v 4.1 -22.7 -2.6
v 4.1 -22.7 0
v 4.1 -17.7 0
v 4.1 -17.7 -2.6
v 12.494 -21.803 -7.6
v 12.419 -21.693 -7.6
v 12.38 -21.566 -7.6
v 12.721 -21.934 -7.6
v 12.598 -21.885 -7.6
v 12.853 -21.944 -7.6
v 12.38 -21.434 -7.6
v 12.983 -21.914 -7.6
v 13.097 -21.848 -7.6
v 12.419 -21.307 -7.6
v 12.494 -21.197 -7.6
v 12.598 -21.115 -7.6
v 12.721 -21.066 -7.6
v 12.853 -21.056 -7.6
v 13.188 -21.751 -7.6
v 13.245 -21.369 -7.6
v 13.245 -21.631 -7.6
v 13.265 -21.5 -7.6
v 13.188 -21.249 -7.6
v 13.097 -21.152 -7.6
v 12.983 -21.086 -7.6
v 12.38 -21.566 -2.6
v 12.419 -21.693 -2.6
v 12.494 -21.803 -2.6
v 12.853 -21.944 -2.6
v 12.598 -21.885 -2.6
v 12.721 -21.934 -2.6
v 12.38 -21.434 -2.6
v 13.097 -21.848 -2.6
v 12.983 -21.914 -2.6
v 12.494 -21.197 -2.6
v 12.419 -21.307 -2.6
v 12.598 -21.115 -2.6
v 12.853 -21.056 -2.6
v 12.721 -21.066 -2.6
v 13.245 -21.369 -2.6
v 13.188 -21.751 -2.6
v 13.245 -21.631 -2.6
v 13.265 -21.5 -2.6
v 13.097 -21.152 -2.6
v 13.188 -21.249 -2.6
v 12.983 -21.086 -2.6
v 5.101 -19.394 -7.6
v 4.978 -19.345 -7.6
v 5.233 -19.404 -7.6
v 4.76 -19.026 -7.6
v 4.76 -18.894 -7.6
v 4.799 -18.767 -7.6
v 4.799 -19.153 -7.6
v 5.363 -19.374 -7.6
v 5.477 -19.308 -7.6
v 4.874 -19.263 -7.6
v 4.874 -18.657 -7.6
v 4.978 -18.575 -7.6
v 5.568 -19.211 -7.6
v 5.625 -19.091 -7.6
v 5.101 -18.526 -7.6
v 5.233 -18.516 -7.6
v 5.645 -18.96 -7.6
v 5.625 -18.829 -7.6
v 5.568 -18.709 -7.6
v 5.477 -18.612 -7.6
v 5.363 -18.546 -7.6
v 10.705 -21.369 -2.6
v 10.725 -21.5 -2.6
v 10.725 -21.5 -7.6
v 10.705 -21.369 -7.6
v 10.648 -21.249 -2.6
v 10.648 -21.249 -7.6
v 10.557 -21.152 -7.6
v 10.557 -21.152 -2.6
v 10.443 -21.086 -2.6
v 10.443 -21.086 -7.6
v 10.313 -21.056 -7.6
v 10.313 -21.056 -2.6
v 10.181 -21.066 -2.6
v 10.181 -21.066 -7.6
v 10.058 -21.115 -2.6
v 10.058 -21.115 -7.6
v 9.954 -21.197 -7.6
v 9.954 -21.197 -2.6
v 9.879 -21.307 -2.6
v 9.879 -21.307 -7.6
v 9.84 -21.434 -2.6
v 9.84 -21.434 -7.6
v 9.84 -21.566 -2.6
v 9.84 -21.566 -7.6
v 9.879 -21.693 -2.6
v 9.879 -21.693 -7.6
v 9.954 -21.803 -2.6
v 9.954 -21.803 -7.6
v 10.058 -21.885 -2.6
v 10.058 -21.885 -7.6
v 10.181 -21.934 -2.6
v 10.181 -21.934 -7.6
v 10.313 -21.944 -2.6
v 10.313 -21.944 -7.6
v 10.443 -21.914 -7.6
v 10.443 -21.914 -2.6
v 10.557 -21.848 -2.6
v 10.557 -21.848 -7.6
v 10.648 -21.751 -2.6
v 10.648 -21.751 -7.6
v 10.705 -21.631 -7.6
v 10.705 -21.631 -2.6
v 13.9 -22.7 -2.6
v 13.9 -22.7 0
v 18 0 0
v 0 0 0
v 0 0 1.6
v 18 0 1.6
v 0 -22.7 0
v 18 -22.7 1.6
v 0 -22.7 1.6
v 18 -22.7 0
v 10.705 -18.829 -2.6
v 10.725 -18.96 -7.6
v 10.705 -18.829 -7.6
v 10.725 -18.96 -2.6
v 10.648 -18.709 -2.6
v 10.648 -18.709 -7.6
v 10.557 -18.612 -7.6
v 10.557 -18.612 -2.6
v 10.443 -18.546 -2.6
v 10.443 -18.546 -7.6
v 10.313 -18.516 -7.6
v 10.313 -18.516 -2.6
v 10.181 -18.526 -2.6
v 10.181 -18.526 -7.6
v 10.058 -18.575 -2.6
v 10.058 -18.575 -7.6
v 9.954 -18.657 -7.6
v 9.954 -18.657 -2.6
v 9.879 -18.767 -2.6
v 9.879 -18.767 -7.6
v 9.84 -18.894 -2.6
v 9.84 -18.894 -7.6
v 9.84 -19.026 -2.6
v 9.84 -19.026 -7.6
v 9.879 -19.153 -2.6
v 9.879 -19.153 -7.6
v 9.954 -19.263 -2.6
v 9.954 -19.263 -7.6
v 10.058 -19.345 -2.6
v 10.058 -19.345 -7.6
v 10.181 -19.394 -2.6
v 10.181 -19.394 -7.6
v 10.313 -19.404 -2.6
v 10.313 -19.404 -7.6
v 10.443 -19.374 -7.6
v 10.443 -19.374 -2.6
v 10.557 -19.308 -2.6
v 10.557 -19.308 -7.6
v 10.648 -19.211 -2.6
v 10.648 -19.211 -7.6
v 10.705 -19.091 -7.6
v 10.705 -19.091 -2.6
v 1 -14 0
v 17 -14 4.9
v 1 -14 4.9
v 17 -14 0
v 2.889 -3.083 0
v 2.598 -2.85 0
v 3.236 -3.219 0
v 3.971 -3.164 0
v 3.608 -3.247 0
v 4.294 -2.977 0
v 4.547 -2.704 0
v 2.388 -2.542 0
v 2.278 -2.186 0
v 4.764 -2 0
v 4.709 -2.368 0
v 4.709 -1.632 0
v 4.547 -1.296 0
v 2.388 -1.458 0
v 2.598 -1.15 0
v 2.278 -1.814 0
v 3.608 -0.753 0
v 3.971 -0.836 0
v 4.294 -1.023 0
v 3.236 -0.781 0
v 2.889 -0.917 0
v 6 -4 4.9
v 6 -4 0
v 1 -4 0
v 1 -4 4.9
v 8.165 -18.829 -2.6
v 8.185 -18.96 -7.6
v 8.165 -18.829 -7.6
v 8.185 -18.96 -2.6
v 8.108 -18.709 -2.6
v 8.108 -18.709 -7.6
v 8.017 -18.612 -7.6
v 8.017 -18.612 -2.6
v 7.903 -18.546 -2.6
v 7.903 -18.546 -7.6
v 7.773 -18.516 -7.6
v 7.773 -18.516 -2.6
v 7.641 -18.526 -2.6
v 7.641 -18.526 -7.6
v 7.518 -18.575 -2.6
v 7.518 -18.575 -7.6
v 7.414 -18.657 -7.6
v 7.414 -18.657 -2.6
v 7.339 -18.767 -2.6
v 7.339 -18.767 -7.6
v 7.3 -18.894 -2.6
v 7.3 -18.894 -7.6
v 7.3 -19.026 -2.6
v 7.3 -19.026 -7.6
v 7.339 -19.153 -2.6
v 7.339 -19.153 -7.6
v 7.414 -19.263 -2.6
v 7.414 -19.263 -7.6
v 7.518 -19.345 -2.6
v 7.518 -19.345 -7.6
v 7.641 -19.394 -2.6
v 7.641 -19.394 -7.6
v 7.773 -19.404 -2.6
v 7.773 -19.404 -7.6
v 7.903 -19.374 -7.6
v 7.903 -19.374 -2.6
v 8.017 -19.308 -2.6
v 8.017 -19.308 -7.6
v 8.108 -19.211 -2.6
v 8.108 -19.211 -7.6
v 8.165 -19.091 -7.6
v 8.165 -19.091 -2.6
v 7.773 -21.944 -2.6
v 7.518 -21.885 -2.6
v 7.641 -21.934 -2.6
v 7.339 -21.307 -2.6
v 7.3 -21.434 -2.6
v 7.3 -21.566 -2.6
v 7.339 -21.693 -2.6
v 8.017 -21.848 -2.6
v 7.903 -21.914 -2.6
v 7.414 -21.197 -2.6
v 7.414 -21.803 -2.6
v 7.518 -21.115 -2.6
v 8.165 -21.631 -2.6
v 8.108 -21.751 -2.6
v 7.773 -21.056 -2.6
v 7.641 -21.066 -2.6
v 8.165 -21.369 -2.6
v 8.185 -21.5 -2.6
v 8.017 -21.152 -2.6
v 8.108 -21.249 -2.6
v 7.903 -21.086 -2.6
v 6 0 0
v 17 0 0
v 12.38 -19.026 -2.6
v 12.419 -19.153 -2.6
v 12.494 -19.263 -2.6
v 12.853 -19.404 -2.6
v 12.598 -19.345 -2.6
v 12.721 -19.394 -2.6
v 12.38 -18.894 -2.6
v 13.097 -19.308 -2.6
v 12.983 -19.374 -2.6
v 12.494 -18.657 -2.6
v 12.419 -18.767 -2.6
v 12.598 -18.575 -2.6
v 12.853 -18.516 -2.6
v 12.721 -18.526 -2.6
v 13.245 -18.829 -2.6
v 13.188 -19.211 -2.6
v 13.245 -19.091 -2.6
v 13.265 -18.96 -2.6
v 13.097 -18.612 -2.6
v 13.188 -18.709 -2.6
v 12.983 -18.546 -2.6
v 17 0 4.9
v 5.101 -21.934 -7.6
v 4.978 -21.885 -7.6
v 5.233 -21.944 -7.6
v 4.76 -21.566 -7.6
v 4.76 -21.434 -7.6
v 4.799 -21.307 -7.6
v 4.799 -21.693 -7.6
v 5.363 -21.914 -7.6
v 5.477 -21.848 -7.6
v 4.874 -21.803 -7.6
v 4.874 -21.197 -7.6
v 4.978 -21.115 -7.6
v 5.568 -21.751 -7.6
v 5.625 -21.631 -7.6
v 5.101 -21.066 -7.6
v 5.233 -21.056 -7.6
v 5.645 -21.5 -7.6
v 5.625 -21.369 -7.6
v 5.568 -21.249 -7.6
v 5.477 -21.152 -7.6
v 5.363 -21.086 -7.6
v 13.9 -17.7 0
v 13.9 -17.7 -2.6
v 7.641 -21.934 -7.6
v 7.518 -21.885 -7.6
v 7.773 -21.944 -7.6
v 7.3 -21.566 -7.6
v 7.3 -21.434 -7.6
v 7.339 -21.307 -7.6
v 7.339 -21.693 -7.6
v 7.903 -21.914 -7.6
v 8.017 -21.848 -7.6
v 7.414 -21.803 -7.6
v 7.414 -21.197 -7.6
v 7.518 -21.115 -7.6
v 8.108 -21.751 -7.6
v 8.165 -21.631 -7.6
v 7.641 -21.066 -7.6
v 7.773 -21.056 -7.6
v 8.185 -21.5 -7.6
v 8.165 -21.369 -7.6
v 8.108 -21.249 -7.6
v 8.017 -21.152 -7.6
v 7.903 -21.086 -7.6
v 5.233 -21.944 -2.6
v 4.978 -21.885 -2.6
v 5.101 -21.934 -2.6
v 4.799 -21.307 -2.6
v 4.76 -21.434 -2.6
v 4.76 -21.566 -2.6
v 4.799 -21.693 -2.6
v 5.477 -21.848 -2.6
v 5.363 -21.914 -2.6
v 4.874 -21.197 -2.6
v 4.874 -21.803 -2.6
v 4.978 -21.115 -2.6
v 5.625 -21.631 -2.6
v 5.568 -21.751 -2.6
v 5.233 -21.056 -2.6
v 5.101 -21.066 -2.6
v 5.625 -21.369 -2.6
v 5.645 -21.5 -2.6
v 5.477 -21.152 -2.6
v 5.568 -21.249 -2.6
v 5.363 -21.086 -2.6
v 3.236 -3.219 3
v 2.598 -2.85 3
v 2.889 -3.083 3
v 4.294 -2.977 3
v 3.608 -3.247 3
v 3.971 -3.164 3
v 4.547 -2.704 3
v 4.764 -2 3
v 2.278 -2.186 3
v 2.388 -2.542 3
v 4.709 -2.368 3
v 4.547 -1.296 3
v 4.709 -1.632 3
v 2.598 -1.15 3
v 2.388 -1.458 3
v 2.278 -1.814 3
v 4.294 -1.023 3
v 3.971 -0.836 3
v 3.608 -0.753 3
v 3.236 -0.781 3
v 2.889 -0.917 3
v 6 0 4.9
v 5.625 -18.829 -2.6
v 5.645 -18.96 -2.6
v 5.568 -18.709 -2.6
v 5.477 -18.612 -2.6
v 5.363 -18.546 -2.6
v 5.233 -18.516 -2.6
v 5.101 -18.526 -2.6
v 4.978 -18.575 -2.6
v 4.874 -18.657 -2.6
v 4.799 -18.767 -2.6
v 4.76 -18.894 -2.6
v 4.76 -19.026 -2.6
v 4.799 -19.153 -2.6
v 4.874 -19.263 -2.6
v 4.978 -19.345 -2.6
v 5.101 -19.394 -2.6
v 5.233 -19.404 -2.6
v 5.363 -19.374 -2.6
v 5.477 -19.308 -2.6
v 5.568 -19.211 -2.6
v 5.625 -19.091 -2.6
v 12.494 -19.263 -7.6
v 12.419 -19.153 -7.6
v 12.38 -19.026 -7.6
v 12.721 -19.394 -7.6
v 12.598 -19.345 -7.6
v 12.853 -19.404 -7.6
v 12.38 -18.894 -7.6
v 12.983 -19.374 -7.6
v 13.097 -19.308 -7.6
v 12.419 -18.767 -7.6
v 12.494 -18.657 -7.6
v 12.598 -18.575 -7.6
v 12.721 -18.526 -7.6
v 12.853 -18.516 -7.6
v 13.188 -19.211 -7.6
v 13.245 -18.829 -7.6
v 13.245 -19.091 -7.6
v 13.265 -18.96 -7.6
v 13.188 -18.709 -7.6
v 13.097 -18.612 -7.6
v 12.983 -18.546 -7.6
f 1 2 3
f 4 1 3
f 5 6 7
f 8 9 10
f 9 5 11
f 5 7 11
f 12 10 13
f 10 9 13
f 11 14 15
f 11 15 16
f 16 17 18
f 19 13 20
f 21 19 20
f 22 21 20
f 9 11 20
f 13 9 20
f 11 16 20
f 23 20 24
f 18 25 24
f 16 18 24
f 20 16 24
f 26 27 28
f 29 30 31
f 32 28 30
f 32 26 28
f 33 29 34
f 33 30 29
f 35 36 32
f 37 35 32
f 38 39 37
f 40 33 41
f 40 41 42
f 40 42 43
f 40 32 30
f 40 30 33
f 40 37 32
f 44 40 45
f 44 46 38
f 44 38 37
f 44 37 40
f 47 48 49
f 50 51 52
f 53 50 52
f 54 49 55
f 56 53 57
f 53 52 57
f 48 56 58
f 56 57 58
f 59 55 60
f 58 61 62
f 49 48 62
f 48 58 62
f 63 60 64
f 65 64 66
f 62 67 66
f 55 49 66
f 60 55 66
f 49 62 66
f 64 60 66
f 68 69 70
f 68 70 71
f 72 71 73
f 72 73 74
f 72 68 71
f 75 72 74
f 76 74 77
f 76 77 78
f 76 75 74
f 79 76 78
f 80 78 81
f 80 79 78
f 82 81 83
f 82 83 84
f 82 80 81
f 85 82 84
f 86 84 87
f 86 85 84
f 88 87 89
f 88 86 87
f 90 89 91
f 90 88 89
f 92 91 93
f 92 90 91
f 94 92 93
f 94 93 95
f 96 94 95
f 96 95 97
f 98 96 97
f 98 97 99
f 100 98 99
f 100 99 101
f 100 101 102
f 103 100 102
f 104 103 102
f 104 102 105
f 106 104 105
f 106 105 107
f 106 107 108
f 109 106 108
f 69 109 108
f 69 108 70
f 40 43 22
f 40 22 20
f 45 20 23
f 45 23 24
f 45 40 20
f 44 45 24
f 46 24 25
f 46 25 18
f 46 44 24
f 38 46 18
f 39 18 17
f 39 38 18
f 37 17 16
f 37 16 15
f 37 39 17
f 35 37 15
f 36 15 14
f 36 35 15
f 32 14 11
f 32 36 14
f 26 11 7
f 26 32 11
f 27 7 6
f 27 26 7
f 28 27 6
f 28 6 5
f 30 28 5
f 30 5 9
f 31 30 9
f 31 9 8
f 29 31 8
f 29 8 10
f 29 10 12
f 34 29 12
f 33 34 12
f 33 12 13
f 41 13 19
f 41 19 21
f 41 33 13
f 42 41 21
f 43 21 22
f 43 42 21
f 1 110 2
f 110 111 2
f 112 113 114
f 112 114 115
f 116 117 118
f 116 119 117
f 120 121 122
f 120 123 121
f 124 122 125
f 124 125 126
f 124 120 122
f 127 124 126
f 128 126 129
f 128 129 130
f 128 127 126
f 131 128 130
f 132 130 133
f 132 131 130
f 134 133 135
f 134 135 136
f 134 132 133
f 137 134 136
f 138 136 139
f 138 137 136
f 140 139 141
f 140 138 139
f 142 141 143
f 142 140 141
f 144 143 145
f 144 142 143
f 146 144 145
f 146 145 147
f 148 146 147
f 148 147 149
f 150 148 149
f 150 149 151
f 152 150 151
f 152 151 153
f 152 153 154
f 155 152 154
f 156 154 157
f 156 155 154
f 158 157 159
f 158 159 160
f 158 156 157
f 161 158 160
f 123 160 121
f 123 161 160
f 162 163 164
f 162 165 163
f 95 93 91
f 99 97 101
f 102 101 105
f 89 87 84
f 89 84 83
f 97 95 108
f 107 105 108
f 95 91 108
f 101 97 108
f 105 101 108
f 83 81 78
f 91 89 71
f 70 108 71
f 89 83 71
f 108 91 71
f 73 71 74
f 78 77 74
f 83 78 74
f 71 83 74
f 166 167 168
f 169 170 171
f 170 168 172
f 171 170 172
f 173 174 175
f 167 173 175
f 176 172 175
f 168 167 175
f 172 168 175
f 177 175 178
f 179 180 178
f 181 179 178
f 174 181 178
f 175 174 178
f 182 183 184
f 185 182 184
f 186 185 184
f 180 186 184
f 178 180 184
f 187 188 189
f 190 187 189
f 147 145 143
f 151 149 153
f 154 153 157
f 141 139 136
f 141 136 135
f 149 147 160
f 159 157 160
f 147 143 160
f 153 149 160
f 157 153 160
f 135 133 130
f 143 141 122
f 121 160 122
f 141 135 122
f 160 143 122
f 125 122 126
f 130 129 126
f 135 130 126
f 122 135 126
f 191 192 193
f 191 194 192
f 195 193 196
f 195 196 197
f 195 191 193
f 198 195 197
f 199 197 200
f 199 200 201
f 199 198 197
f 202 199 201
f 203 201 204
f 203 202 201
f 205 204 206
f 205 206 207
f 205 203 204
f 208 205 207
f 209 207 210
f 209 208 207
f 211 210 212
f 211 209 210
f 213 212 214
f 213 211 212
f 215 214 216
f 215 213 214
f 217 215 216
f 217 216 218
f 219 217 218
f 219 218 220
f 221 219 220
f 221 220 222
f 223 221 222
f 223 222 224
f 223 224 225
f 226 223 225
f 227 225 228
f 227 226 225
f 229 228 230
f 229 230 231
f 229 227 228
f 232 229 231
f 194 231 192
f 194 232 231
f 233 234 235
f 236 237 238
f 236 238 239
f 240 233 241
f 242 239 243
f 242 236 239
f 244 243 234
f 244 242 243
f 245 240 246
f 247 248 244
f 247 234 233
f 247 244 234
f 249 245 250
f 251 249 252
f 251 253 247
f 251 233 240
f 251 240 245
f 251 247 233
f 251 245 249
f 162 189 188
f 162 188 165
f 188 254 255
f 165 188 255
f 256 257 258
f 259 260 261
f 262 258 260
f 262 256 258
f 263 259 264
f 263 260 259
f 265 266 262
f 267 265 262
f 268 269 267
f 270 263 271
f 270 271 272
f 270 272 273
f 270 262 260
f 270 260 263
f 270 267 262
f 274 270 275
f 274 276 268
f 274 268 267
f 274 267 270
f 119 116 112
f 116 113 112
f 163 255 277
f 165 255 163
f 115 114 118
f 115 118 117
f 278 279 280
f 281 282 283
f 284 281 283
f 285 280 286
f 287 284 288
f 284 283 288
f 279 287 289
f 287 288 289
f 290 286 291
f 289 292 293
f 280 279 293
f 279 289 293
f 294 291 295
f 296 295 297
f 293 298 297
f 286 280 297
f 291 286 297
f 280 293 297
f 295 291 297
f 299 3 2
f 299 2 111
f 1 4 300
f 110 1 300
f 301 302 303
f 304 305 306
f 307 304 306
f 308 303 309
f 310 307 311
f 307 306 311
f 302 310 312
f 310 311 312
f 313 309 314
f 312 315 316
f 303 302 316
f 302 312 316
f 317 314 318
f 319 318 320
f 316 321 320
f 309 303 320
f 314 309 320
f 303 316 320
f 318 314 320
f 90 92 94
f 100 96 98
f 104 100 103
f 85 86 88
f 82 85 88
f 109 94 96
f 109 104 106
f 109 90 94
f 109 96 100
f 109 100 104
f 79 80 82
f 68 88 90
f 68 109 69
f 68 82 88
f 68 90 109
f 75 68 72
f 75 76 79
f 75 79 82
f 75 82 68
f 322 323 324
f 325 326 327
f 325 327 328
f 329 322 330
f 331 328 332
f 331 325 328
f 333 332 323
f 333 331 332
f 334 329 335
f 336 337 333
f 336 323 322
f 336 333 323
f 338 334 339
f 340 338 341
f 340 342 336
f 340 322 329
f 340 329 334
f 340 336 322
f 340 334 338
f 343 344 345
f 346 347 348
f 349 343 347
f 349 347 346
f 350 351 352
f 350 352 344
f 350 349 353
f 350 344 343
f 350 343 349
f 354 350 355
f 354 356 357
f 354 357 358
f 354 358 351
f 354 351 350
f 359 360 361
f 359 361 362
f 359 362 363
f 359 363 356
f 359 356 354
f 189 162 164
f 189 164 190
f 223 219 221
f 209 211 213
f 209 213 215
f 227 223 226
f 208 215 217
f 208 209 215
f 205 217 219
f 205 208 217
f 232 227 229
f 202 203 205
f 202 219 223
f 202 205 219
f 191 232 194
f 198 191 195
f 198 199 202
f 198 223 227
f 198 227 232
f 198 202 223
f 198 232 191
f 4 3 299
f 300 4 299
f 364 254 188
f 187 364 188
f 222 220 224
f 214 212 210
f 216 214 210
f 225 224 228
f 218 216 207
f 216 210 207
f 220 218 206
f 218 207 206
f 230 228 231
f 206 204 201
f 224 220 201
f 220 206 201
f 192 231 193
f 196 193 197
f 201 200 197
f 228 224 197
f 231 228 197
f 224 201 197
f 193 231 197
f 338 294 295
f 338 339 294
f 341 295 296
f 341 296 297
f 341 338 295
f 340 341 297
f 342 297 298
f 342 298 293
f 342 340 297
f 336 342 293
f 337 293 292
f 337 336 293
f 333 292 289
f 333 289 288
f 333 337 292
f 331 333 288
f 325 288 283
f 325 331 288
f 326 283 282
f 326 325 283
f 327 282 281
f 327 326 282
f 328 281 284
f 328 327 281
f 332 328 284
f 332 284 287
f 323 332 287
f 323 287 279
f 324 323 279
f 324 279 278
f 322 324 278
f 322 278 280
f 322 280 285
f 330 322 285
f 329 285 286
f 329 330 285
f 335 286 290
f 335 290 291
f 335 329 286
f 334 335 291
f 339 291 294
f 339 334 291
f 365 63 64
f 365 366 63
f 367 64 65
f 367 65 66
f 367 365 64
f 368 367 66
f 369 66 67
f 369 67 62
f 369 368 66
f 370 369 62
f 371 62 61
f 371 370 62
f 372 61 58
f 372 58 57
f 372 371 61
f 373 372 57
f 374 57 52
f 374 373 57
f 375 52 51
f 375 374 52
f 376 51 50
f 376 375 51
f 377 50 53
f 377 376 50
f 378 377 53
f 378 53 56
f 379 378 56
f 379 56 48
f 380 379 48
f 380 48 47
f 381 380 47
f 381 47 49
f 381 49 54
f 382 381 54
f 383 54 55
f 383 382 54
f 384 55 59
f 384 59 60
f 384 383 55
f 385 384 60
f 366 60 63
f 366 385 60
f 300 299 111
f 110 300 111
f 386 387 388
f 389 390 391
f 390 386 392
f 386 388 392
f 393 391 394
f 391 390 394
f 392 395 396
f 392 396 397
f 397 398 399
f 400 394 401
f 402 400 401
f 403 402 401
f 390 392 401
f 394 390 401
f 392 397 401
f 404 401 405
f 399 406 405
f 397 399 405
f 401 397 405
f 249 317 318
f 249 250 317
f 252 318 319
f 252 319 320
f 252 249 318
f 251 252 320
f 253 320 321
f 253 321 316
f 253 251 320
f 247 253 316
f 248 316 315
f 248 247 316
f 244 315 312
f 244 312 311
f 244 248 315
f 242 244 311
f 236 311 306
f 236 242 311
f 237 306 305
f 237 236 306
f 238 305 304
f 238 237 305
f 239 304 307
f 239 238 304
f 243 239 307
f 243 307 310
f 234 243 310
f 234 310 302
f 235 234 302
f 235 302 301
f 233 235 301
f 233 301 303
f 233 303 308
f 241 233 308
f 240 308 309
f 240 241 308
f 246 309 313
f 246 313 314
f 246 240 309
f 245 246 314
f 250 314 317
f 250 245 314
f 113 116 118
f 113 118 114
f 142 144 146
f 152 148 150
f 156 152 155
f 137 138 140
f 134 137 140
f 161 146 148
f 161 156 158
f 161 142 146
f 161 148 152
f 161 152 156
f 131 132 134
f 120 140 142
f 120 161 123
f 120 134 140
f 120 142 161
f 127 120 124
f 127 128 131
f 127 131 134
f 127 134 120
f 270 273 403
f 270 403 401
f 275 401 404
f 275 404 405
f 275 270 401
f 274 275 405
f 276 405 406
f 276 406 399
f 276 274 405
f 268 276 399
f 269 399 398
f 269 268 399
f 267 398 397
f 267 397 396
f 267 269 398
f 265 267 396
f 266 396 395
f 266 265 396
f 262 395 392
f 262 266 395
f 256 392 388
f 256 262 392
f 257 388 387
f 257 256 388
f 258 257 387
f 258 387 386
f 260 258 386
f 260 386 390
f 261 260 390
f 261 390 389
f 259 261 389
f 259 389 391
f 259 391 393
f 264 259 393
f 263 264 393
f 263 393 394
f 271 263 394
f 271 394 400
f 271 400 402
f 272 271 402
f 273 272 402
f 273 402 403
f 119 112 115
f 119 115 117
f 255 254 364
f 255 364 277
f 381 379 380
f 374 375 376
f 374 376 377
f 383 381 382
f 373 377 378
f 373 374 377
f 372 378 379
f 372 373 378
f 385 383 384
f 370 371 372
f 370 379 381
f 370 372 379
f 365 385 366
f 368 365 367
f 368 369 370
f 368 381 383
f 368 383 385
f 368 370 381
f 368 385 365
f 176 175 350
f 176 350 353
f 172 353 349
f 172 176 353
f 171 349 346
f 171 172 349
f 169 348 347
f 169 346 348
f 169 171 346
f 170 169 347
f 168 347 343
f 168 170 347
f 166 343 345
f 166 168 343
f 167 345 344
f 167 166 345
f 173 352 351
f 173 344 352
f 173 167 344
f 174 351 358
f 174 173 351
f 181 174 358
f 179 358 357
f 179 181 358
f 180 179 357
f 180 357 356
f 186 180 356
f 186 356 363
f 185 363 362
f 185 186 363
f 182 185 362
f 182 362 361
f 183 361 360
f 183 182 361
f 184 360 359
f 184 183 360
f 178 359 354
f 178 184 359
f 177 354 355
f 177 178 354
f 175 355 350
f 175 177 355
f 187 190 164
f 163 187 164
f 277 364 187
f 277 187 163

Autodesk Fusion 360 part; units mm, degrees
sketch "Esquisse1" plane through (0, 0, 0) normal (0, 0, 1) x (1, 0, 0) in component "LoRa RA-02"
  line L0 (0, 0) -> (18, 0)
  line L1 (18, 0) -> (18, -22.7)
  line L2 (18, -22.7) -> (0, -22.7)
  line L3 (0, -22.7) -> (0, 0)
  line L4 (1, 0) -> (17, 0)
  line L5 (17, 0) -> (17, -14)
  line L6 (17, -14) -> (1, -14)
  line L7 (1, -14) -> (1, 0)
  line L8 (13.9, -22.7) -> (4.1, -22.7)
  line L9 (4.1, -22.7) -> (4.1, -17.7)
  line L10 (4.1, -17.7) -> (13.9, -17.7)
  line L11 (13.9, -17.7) -> (13.9, -22.7)
  line L12 (1, 0) -> (6, 0)
  line L13 (6, 0) -> (6, -4)
  line L14 (6, -4) -> (1, -4)
  line L15 (1, -4) -> (1, 0)
  circle A0 centre (3.5142, -2) radius 1.25
  circle A1 centre (5.2, -21.5) radius 0.445
  circle A2 centre (7.74, -21.5) radius 0.445
  circle A3 centre (10.28, -21.5) radius 0.445
  circle A4 centre (12.82, -21.5) radius 0.445
  circle A5 centre (5.2, -18.96) radius 0.445
  circle A6 centre (7.74, -18.96) radius 0.445
  circle A7 centre (10.28, -18.96) radius 0.445
  circle A8 centre (12.82, -18.96) radius 0.445
  dimension "d1" = 18
  dimension "d2" = 22.7
  dimension "d3" = 16
  dimension "d4" = 14
  dimension "d5" = 9.8
  dimension "d6" = 5
  dimension "d7" = 5
  dimension "d8" = 4
  dimension "d9" = 2.5
  dimension "d18" = 0.89
  dimension "d21" = 7.62
  dimension "d22" = 2.54
  dimension "d23" = 1.2
  dimension "d24" = 1.1
extrude "Extrusion1" add sketch "Esquisse1" along normal blind 1.6 contours L0 L1 L2 L3 L5 L6 L7 L9 L10 L11 L15 | L0 L4 L7 L12 L13 L14 L15 | L0 L4 L5 L6 L7 L13 L14 | L2 L8 L9 L10 L11 | A0 | A1 | A2 | A3 | A4 | A5 | A6 | A7 | A8 makes body 1 in component "LoRa RA-02"
extrude "Extrusion2" add sketch "Esquisse1" against normal blind 2.6 separate body contours L2 L8 L9 L10 L11 | A1 | A2 | A3 | A4 | A5 | A6 | A7 | A8 makes body 2 in component "LoRa RA-02"
extrude "Extrusion3" add sketch "Esquisse1" along normal blind 4.9 separate body contours L0 L4 L5 L6 L7 L13 L14 makes body 3 in component "LoRa RA-02"
extrude "Extrusion4" add sketch "Esquisse1" along normal blind 3 separate body contours A0 makes body 4 in component "LoRa RA-02"
extrude "Extrusion5" add sketch "Esquisse1" against normal blind 5 from surface at -2.6 separate body contours A1 | A2 | A3 | A4 | A5 | A6 | A7 | A8 makes body 5 at (10.077, -19.356, -4.2667) makes body 6 at (8.1712, -21.6098, -5.9333) makes body 7 at (12.617, -21.896, -4.2667) makes body 8 at (8.1712, -19.0698, -5.9333) makes body 9 at (12.617, -19.356, -4.2667) makes body 10 at (5.6312, -21.6098, -5.9333) makes body 11 at (10.077, -21.896, -4.2667) makes body 12 at (5.6312, -19.0698, -5.9333) in component "LoRa RA-02"
component "LoRa RA-02" placed x (1, 0, 0) y (0, 1, 0) z (0, 0, 1) at (0, 0, 0)
